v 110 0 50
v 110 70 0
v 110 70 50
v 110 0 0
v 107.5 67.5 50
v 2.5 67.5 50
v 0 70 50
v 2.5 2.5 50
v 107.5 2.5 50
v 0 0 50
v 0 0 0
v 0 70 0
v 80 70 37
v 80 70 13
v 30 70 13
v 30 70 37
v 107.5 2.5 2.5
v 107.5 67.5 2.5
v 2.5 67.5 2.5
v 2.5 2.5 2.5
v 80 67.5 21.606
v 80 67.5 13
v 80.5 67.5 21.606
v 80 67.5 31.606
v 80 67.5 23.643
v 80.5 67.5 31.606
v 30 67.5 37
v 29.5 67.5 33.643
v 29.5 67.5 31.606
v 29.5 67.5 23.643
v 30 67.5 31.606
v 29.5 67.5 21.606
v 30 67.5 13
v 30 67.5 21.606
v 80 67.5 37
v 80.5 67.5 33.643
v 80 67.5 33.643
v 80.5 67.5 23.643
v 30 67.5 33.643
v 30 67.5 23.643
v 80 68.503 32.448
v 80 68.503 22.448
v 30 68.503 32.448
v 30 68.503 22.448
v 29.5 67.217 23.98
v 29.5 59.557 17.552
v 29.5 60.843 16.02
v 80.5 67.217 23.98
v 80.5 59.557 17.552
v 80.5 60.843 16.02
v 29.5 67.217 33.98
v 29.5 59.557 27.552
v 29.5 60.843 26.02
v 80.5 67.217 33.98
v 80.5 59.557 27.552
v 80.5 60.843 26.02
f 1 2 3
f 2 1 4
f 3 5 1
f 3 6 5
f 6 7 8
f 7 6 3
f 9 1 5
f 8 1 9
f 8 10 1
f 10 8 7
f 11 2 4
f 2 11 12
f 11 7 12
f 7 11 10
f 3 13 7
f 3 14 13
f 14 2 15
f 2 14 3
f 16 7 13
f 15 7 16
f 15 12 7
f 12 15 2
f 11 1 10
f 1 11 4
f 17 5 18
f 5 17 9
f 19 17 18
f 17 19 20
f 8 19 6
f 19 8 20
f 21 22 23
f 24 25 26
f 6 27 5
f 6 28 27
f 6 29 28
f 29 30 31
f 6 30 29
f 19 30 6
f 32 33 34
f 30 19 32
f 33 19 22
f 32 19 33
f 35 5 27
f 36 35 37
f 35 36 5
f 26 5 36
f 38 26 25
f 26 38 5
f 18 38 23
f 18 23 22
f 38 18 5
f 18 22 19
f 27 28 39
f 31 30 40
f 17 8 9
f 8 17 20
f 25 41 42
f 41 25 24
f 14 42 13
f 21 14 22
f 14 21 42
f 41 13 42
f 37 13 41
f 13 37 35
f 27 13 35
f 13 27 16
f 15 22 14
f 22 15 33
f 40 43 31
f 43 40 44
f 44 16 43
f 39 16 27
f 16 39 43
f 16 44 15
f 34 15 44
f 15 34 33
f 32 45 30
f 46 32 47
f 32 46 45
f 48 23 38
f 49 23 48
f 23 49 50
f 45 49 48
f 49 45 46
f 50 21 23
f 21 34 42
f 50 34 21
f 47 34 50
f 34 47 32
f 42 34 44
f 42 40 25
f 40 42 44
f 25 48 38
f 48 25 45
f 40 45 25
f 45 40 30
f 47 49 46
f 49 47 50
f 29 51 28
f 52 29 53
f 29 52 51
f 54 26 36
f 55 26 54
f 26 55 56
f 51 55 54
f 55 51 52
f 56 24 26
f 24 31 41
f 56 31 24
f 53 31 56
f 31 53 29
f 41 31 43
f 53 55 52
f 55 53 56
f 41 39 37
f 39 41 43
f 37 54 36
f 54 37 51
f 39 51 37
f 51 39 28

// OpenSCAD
$fn = 32;

// ----------------------------------------------------------------------
// Vent box: louvers enclosure
// ----------------------------------------------------------------------

// --- parameters (mm) ---
box_l = 110;              // box length, X
box_w = 70;               // box width, Y
box_h = 50;               // box height, Z
wall_t = 2.5;             // shell wall thickness
win_l = 50;               // vent window width, X
win_h = 24;               // vent window height, Z
slat_t = 2;               // louver slat thickness
slat_d = 10;              // louver slat depth
slat_a = 40;              // louver slat angle, degrees
slat_pitch = 10;          // louver pitch
slat_yc = 64.03;          // slat centreline Y

win_z0 = (box_h - win_h) / 2;  // window lower edge Z
n_slats = 2;  // louver count
slat_z0 = win_z0 + (win_h - (n_slats - 1) * slat_pitch) / 2;

difference() {
  union() {
    difference() {
      cube([box_l, box_w, box_h]);
  translate([wall_t, wall_t, wall_t])
    cube([box_l - 2 * wall_t, box_w - 2 * wall_t, box_h]);
  translate([(box_l - win_l) / 2, box_w - wall_t - 1, win_z0])
    cube([win_l, wall_t + 2, win_h]);
    }
    for (i = [0 : n_slats - 1])
      translate([box_l / 2, slat_yc, slat_z0 + i * slat_pitch])
        rotate([slat_a, 0, 0])
          cube([win_l + 1, slat_d, slat_t], center = true);
  }
}
